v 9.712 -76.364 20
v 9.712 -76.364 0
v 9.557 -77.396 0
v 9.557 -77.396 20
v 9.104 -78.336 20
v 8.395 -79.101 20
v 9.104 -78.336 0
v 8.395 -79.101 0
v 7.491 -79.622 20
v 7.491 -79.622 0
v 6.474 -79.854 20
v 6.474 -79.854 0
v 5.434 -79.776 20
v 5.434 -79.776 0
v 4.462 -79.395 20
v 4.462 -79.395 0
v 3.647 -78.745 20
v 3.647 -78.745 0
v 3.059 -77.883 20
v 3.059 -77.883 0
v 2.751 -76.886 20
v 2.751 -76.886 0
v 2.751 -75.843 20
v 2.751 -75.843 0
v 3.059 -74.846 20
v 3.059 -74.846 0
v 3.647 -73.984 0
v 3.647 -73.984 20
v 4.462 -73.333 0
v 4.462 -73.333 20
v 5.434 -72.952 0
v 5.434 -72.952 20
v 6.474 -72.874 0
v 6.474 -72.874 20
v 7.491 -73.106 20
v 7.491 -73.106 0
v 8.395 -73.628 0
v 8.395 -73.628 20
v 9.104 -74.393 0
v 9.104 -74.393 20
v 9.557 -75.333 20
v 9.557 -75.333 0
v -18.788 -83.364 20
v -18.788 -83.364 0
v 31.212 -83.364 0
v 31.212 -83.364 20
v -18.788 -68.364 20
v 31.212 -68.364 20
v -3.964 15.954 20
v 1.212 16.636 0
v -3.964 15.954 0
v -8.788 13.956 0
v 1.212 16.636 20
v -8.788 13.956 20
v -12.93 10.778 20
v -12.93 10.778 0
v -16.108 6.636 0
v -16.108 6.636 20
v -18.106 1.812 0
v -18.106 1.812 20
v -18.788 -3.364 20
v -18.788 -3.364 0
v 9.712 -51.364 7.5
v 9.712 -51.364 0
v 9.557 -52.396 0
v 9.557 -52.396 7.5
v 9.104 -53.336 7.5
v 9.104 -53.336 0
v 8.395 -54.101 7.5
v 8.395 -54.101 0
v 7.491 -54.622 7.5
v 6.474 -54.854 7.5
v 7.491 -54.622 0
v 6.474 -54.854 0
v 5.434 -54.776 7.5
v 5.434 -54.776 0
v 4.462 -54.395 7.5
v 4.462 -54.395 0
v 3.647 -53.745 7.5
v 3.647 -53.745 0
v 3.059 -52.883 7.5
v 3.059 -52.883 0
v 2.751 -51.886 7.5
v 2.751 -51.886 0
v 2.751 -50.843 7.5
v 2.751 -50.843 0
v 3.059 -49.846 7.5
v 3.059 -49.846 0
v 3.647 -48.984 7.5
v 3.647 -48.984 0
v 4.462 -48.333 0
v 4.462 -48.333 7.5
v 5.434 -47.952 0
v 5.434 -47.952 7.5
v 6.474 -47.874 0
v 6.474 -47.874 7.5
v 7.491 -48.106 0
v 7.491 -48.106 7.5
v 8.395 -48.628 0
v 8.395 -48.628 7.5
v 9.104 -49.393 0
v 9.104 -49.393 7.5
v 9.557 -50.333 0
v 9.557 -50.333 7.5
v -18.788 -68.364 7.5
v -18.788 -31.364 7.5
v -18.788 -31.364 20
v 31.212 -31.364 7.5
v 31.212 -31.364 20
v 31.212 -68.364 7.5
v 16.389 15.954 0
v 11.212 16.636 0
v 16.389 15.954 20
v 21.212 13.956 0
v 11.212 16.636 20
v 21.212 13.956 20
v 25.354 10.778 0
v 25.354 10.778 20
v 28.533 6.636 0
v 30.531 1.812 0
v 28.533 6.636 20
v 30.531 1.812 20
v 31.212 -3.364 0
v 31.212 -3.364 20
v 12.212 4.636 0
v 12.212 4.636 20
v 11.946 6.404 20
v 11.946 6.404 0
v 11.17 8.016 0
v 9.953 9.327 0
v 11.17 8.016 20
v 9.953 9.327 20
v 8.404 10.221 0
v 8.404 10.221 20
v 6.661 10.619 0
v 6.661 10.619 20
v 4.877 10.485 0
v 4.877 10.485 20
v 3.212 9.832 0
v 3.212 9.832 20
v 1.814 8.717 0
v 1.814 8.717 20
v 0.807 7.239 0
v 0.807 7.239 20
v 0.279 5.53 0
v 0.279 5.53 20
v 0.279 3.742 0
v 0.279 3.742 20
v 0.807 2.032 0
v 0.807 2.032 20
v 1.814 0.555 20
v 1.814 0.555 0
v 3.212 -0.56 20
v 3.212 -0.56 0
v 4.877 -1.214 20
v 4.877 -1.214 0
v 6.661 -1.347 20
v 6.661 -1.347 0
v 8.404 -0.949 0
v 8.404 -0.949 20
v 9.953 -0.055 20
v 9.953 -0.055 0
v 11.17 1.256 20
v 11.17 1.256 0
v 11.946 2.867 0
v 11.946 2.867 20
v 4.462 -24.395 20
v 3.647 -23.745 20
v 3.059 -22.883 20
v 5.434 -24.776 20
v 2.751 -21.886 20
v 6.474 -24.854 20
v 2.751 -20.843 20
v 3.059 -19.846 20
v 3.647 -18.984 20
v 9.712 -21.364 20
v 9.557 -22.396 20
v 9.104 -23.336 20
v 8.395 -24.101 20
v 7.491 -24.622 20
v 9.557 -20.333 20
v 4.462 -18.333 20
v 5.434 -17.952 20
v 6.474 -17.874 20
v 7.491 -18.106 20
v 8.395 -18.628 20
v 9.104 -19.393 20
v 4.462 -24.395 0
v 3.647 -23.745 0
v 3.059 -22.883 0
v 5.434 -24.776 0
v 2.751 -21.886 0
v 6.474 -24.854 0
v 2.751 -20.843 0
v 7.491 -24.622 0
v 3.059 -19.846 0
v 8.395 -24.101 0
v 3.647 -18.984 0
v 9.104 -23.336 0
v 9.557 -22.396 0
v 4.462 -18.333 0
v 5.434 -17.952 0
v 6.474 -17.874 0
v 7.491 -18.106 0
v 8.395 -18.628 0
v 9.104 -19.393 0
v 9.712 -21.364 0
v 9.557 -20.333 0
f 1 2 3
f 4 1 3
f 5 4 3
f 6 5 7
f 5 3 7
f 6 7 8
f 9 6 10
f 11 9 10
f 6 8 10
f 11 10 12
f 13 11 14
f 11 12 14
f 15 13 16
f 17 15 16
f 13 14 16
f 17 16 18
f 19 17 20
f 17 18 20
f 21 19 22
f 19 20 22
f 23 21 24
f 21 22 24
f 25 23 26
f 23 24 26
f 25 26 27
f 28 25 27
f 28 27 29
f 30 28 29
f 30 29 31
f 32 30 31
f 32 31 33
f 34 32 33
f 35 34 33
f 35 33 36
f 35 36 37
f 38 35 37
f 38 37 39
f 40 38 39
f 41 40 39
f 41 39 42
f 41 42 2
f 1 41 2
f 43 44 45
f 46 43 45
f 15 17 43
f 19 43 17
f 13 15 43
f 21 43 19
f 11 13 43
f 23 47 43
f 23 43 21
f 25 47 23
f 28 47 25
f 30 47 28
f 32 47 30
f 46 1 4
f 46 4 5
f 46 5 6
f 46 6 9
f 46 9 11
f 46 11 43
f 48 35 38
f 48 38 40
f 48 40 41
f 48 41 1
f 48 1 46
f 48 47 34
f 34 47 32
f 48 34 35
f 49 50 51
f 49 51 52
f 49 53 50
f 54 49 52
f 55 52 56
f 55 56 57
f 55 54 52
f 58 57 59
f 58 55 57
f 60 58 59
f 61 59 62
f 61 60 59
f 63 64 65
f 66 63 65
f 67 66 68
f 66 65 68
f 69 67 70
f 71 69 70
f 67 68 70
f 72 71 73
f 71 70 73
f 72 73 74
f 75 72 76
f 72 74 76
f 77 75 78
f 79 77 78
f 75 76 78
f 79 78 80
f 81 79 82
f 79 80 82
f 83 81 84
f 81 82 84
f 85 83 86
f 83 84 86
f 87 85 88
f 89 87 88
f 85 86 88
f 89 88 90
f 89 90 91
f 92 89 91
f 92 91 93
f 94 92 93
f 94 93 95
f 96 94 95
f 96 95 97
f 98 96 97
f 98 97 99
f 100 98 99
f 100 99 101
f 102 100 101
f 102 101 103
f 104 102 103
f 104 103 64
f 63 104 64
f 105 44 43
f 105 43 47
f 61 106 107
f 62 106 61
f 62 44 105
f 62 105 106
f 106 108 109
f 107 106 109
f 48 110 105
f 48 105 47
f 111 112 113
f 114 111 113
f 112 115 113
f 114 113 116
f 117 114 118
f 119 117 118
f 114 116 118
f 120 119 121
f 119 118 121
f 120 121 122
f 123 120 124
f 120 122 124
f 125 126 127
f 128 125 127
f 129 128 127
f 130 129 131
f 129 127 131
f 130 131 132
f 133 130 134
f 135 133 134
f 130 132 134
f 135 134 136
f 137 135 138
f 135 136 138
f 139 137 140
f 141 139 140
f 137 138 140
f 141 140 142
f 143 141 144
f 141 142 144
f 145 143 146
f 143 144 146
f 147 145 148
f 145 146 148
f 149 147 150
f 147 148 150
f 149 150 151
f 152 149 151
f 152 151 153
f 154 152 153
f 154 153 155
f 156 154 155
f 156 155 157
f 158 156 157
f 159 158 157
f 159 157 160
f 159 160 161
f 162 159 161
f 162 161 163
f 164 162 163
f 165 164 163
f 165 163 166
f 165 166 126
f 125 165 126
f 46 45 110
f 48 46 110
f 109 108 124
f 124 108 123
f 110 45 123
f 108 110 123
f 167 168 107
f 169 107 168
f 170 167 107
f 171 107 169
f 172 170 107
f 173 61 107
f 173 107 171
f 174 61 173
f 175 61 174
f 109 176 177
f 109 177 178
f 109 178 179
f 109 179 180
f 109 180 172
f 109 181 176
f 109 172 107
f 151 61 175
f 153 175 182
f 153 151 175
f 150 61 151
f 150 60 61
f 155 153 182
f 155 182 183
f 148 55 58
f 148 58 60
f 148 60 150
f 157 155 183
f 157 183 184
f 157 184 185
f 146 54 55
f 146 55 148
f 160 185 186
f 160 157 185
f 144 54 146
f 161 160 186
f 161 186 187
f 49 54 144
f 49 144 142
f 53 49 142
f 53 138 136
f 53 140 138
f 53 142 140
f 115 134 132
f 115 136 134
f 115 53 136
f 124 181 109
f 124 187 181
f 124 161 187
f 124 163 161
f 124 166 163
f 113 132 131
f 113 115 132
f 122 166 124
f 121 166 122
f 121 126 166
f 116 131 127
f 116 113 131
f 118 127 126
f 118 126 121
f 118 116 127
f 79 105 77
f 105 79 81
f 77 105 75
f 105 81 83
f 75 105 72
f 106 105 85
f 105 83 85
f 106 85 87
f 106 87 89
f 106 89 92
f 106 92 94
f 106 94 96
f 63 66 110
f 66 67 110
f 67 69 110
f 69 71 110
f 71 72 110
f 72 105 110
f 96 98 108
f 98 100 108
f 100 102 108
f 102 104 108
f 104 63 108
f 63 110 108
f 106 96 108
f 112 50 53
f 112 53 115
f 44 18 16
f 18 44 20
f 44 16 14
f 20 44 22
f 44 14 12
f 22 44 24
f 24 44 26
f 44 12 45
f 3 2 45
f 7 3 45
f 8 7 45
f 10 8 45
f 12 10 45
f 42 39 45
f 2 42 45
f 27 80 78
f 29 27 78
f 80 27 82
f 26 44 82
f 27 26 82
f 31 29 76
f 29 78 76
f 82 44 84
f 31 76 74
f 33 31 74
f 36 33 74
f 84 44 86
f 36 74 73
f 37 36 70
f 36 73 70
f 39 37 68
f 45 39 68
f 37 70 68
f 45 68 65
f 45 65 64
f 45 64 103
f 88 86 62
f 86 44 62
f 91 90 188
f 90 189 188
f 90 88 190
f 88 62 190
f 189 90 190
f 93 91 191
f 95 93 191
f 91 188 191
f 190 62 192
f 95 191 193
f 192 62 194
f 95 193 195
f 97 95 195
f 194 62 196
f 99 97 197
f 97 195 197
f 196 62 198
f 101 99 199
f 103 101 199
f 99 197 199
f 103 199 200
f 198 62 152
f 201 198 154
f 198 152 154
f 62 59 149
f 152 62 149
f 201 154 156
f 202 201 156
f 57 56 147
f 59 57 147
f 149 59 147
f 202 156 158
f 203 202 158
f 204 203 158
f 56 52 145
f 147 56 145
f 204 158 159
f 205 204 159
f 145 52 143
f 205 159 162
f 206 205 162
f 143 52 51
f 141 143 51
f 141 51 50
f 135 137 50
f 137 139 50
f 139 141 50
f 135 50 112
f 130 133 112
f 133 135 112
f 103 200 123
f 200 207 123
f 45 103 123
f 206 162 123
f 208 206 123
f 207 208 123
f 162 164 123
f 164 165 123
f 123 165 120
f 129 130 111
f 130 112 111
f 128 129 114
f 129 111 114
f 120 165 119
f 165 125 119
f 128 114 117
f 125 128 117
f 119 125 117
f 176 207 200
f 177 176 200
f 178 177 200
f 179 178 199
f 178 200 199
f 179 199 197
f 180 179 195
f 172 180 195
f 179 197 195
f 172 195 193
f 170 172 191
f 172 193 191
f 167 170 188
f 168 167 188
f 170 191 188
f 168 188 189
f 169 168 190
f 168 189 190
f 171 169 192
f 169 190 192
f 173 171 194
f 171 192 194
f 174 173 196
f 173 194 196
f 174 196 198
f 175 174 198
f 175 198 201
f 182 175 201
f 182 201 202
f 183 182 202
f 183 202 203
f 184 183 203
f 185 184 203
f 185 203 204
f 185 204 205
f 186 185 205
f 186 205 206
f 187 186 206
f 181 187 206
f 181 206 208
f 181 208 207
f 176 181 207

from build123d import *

# Parameters (mm, degrees)
F0_W     = 50
F0_H     = 100
F1_DEPTH = 20
F2_R     = 6
F3_DEPTH = 25
F4_R     = 20
F5_R     = 20
F6_W     = 37
F6_H     = 12.5
F7_DEPTH = 50.001
F8_R     = 3.5
F9_DEPTH = 20.001


with BuildPart() as f1:
    # F0 (on Top) → F1 (new body)
    with BuildSketch(Plane.XY):
        with Locations((6.21234, -33.364211)):
            Rectangle(F0_W, F0_H)
    extrude(amount=F1_DEPTH)

    # F2 (on face) → F3 (cut)
    with BuildSketch(Plane.XY.offset(20)):
        with Locations((6.21234, 4.635789)):
            Circle(F2_R)
    extrude(amount=-F3_DEPTH, mode=Mode.SUBTRACT)

    # F4
    f4_edges = [f1.edges().sort_by_distance(p)[0] for p in [
        (31.21234, 16.635789, 10),
    ]]
    fillet(f4_edges, radius=F4_R)

    # F5
    f5_edges = [f1.edges().sort_by_distance(p)[0] for p in [
        (-18.78766, 16.635789, 10),
    ]]
    fillet(f5_edges, radius=F5_R)

    # F6 (on face) → F7 (cut, through all)
    with BuildSketch(Plane.YZ.offset(31.21234)):
        with Locations((-49.864211, 13.75)):
            Rectangle(F6_W, F6_H)
    extrude(amount=-F7_DEPTH, mode=Mode.SUBTRACT)

    # F8 (on face) → F9 (cut, through all)
    with BuildSketch(Plane(origin=(0, 0, 0), x_dir=(1, 0, 0), z_dir=(0, 0, -1))):
        with Locations((6.21234, 51.364211)):
            Circle(F8_R)
        with Locations((6.21234, 21.364211)):
            Circle(F8_R)
        with Locations((6.21234, 76.364211)):
            Circle(F8_R)
    extrude(amount=-F9_DEPTH, mode=Mode.SUBTRACT)


solid = f1.part
